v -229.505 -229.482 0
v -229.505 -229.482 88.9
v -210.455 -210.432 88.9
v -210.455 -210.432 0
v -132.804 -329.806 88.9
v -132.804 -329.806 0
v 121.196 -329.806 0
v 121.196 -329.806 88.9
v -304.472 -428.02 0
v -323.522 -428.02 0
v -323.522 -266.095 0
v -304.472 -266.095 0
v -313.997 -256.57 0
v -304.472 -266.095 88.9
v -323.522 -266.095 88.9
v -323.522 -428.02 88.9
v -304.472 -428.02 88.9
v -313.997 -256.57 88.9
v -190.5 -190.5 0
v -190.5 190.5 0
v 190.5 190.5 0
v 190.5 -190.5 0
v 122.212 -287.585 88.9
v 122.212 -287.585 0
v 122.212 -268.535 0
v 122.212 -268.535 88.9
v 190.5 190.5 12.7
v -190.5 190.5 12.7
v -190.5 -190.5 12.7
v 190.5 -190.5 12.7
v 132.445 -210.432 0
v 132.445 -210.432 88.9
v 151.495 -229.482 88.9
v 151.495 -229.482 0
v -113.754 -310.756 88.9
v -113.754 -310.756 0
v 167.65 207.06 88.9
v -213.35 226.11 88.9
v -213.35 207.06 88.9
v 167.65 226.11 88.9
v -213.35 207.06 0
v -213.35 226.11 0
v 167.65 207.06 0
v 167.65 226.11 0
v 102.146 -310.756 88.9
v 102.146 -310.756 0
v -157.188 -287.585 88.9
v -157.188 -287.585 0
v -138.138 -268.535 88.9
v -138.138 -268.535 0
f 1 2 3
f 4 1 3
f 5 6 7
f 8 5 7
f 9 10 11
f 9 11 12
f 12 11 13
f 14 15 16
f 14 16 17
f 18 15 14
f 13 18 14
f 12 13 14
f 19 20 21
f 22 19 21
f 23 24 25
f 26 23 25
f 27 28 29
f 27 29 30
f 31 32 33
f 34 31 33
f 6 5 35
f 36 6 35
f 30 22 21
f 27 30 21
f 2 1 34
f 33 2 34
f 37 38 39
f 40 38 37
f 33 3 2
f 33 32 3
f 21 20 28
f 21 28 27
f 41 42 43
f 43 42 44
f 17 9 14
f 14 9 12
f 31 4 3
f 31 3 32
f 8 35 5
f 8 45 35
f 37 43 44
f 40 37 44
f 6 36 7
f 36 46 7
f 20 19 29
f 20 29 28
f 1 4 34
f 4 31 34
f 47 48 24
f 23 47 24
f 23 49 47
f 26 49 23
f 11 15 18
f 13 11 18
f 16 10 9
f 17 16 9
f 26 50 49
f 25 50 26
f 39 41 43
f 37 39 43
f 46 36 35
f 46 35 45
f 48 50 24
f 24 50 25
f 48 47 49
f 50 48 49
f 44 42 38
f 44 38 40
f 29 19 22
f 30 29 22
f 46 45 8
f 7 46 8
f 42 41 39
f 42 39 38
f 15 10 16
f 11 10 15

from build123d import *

# Parameters (mm, degrees)
F0_W      = 381
F0_H      = 381
F1_DEPTH  = 12.7
F2_W      = 381
F2_H      = 19.05
F3_DEPTH  = 88.9
F4_W      = 381
F4_H      = 19.05
F5_DEPTH  = 88.9
F7_DEPTH  = 88.901
F8_W      = 279.4
F8_H      = 19.05
F9_DEPTH  = 88.9
F10_W     = 254
F10_H     = 19.05
F11_DEPTH = 88.9
F13_DEPTH = 88.901
F15_DEPTH = 88.901
F16_W     = 19.05
F16_H     = 171.45
F17_DEPTH = 88.9
F19_DEPTH = 88.901


with BuildPart() as f1:
    # F0 (on Top) → F1 (new body)
    with BuildSketch(Plane.XY):
        Rectangle(F0_W, F0_H)
    extrude(amount=F1_DEPTH)


with BuildPart() as f3:
    # F2 (on Top) → F3 (new body)
    with BuildSketch(Plane.XY):
        with Locations((-22.850419, 216.584572)):
            Rectangle(F2_W, F2_H)
    extrude(amount=F3_DEPTH)


with BuildPart() as f5:
    # F4 (on Top) → F5 (new body)
    with BuildSketch(Plane.XY):
        with Locations((-39.005031, -219.956725)):
            Rectangle(F4_W, F4_H)
    extrude(amount=F5_DEPTH)

    # F6 (on face) → F7 (cut, through all)
    with BuildSketch(Plane.XY.offset(88.9)):
        Polygon((-210.455031, -210.431725), (-229.505031, -210.431725), (-229.505031, -229.481725), align=None)
        Polygon((151.494969, -229.481725), (151.494969, -210.431725), (132.444969, -210.431725), align=None)
    extrude(amount=-F7_DEPTH, mode=Mode.SUBTRACT)


with BuildPart() as f9:
    # F8 (on Top) → F9 (new body)
    with BuildSketch(Plane.XY):
        with Locations((-17.488475, -278.059736)):
            Rectangle(F8_W, F8_H)
    extrude(amount=F9_DEPTH)

    # F12 (on face) → F13 (cut, through all)
    with BuildSketch(Plane.XY.offset(88.9)):
        Polygon((-138.138475, -268.534736), (-157.188475, -268.534736), (-157.188475, -287.584736), align=None)
    extrude(amount=-F13_DEPTH, mode=Mode.SUBTRACT)


with BuildPart() as f11:
    # F10 (on Top) → F11 (new body)
    with BuildSketch(Plane.XY):
        with Locations((-5.803525, -320.281237)):
            Rectangle(F10_W, F10_H)
    extrude(amount=F11_DEPTH)

    # F14 (on face) → F15 (cut, through all)
    with BuildSketch(Plane.XY.offset(88.9)):
        Polygon((-132.803525, -310.756237), (-132.803525, -329.806237), (-113.753525, -310.756237), align=None)
        Polygon((121.196475, -310.756237), (102.146475, -310.756237), (121.196475, -329.806237), align=None)
    extrude(amount=-F15_DEPTH, mode=Mode.SUBTRACT)


with BuildPart() as f17:
    # F16 (on Top) → F17 (new body)
    with BuildSketch(Plane.XY):
        with Locations((-313.99744, -342.295409)):
            Rectangle(F16_W, F16_H)
    extrude(amount=F17_DEPTH)

    # F18 (on face) → F19 (cut, through all)
    with BuildSketch(Plane.XY.offset(88.9)):
        Polygon((-323.52244, -256.570409), (-323.52244, -266.095409), (-313.99744, -256.570409), align=None)
        Polygon((-304.47244, -256.570409), (-313.99744, -256.570409), (-304.47244, -266.095409), align=None)
    extrude(amount=-F19_DEPTH, mode=Mode.SUBTRACT)


solid = Compound([f1.part, f3.part, f5.part, f9.part, f11.part, f17.part])
